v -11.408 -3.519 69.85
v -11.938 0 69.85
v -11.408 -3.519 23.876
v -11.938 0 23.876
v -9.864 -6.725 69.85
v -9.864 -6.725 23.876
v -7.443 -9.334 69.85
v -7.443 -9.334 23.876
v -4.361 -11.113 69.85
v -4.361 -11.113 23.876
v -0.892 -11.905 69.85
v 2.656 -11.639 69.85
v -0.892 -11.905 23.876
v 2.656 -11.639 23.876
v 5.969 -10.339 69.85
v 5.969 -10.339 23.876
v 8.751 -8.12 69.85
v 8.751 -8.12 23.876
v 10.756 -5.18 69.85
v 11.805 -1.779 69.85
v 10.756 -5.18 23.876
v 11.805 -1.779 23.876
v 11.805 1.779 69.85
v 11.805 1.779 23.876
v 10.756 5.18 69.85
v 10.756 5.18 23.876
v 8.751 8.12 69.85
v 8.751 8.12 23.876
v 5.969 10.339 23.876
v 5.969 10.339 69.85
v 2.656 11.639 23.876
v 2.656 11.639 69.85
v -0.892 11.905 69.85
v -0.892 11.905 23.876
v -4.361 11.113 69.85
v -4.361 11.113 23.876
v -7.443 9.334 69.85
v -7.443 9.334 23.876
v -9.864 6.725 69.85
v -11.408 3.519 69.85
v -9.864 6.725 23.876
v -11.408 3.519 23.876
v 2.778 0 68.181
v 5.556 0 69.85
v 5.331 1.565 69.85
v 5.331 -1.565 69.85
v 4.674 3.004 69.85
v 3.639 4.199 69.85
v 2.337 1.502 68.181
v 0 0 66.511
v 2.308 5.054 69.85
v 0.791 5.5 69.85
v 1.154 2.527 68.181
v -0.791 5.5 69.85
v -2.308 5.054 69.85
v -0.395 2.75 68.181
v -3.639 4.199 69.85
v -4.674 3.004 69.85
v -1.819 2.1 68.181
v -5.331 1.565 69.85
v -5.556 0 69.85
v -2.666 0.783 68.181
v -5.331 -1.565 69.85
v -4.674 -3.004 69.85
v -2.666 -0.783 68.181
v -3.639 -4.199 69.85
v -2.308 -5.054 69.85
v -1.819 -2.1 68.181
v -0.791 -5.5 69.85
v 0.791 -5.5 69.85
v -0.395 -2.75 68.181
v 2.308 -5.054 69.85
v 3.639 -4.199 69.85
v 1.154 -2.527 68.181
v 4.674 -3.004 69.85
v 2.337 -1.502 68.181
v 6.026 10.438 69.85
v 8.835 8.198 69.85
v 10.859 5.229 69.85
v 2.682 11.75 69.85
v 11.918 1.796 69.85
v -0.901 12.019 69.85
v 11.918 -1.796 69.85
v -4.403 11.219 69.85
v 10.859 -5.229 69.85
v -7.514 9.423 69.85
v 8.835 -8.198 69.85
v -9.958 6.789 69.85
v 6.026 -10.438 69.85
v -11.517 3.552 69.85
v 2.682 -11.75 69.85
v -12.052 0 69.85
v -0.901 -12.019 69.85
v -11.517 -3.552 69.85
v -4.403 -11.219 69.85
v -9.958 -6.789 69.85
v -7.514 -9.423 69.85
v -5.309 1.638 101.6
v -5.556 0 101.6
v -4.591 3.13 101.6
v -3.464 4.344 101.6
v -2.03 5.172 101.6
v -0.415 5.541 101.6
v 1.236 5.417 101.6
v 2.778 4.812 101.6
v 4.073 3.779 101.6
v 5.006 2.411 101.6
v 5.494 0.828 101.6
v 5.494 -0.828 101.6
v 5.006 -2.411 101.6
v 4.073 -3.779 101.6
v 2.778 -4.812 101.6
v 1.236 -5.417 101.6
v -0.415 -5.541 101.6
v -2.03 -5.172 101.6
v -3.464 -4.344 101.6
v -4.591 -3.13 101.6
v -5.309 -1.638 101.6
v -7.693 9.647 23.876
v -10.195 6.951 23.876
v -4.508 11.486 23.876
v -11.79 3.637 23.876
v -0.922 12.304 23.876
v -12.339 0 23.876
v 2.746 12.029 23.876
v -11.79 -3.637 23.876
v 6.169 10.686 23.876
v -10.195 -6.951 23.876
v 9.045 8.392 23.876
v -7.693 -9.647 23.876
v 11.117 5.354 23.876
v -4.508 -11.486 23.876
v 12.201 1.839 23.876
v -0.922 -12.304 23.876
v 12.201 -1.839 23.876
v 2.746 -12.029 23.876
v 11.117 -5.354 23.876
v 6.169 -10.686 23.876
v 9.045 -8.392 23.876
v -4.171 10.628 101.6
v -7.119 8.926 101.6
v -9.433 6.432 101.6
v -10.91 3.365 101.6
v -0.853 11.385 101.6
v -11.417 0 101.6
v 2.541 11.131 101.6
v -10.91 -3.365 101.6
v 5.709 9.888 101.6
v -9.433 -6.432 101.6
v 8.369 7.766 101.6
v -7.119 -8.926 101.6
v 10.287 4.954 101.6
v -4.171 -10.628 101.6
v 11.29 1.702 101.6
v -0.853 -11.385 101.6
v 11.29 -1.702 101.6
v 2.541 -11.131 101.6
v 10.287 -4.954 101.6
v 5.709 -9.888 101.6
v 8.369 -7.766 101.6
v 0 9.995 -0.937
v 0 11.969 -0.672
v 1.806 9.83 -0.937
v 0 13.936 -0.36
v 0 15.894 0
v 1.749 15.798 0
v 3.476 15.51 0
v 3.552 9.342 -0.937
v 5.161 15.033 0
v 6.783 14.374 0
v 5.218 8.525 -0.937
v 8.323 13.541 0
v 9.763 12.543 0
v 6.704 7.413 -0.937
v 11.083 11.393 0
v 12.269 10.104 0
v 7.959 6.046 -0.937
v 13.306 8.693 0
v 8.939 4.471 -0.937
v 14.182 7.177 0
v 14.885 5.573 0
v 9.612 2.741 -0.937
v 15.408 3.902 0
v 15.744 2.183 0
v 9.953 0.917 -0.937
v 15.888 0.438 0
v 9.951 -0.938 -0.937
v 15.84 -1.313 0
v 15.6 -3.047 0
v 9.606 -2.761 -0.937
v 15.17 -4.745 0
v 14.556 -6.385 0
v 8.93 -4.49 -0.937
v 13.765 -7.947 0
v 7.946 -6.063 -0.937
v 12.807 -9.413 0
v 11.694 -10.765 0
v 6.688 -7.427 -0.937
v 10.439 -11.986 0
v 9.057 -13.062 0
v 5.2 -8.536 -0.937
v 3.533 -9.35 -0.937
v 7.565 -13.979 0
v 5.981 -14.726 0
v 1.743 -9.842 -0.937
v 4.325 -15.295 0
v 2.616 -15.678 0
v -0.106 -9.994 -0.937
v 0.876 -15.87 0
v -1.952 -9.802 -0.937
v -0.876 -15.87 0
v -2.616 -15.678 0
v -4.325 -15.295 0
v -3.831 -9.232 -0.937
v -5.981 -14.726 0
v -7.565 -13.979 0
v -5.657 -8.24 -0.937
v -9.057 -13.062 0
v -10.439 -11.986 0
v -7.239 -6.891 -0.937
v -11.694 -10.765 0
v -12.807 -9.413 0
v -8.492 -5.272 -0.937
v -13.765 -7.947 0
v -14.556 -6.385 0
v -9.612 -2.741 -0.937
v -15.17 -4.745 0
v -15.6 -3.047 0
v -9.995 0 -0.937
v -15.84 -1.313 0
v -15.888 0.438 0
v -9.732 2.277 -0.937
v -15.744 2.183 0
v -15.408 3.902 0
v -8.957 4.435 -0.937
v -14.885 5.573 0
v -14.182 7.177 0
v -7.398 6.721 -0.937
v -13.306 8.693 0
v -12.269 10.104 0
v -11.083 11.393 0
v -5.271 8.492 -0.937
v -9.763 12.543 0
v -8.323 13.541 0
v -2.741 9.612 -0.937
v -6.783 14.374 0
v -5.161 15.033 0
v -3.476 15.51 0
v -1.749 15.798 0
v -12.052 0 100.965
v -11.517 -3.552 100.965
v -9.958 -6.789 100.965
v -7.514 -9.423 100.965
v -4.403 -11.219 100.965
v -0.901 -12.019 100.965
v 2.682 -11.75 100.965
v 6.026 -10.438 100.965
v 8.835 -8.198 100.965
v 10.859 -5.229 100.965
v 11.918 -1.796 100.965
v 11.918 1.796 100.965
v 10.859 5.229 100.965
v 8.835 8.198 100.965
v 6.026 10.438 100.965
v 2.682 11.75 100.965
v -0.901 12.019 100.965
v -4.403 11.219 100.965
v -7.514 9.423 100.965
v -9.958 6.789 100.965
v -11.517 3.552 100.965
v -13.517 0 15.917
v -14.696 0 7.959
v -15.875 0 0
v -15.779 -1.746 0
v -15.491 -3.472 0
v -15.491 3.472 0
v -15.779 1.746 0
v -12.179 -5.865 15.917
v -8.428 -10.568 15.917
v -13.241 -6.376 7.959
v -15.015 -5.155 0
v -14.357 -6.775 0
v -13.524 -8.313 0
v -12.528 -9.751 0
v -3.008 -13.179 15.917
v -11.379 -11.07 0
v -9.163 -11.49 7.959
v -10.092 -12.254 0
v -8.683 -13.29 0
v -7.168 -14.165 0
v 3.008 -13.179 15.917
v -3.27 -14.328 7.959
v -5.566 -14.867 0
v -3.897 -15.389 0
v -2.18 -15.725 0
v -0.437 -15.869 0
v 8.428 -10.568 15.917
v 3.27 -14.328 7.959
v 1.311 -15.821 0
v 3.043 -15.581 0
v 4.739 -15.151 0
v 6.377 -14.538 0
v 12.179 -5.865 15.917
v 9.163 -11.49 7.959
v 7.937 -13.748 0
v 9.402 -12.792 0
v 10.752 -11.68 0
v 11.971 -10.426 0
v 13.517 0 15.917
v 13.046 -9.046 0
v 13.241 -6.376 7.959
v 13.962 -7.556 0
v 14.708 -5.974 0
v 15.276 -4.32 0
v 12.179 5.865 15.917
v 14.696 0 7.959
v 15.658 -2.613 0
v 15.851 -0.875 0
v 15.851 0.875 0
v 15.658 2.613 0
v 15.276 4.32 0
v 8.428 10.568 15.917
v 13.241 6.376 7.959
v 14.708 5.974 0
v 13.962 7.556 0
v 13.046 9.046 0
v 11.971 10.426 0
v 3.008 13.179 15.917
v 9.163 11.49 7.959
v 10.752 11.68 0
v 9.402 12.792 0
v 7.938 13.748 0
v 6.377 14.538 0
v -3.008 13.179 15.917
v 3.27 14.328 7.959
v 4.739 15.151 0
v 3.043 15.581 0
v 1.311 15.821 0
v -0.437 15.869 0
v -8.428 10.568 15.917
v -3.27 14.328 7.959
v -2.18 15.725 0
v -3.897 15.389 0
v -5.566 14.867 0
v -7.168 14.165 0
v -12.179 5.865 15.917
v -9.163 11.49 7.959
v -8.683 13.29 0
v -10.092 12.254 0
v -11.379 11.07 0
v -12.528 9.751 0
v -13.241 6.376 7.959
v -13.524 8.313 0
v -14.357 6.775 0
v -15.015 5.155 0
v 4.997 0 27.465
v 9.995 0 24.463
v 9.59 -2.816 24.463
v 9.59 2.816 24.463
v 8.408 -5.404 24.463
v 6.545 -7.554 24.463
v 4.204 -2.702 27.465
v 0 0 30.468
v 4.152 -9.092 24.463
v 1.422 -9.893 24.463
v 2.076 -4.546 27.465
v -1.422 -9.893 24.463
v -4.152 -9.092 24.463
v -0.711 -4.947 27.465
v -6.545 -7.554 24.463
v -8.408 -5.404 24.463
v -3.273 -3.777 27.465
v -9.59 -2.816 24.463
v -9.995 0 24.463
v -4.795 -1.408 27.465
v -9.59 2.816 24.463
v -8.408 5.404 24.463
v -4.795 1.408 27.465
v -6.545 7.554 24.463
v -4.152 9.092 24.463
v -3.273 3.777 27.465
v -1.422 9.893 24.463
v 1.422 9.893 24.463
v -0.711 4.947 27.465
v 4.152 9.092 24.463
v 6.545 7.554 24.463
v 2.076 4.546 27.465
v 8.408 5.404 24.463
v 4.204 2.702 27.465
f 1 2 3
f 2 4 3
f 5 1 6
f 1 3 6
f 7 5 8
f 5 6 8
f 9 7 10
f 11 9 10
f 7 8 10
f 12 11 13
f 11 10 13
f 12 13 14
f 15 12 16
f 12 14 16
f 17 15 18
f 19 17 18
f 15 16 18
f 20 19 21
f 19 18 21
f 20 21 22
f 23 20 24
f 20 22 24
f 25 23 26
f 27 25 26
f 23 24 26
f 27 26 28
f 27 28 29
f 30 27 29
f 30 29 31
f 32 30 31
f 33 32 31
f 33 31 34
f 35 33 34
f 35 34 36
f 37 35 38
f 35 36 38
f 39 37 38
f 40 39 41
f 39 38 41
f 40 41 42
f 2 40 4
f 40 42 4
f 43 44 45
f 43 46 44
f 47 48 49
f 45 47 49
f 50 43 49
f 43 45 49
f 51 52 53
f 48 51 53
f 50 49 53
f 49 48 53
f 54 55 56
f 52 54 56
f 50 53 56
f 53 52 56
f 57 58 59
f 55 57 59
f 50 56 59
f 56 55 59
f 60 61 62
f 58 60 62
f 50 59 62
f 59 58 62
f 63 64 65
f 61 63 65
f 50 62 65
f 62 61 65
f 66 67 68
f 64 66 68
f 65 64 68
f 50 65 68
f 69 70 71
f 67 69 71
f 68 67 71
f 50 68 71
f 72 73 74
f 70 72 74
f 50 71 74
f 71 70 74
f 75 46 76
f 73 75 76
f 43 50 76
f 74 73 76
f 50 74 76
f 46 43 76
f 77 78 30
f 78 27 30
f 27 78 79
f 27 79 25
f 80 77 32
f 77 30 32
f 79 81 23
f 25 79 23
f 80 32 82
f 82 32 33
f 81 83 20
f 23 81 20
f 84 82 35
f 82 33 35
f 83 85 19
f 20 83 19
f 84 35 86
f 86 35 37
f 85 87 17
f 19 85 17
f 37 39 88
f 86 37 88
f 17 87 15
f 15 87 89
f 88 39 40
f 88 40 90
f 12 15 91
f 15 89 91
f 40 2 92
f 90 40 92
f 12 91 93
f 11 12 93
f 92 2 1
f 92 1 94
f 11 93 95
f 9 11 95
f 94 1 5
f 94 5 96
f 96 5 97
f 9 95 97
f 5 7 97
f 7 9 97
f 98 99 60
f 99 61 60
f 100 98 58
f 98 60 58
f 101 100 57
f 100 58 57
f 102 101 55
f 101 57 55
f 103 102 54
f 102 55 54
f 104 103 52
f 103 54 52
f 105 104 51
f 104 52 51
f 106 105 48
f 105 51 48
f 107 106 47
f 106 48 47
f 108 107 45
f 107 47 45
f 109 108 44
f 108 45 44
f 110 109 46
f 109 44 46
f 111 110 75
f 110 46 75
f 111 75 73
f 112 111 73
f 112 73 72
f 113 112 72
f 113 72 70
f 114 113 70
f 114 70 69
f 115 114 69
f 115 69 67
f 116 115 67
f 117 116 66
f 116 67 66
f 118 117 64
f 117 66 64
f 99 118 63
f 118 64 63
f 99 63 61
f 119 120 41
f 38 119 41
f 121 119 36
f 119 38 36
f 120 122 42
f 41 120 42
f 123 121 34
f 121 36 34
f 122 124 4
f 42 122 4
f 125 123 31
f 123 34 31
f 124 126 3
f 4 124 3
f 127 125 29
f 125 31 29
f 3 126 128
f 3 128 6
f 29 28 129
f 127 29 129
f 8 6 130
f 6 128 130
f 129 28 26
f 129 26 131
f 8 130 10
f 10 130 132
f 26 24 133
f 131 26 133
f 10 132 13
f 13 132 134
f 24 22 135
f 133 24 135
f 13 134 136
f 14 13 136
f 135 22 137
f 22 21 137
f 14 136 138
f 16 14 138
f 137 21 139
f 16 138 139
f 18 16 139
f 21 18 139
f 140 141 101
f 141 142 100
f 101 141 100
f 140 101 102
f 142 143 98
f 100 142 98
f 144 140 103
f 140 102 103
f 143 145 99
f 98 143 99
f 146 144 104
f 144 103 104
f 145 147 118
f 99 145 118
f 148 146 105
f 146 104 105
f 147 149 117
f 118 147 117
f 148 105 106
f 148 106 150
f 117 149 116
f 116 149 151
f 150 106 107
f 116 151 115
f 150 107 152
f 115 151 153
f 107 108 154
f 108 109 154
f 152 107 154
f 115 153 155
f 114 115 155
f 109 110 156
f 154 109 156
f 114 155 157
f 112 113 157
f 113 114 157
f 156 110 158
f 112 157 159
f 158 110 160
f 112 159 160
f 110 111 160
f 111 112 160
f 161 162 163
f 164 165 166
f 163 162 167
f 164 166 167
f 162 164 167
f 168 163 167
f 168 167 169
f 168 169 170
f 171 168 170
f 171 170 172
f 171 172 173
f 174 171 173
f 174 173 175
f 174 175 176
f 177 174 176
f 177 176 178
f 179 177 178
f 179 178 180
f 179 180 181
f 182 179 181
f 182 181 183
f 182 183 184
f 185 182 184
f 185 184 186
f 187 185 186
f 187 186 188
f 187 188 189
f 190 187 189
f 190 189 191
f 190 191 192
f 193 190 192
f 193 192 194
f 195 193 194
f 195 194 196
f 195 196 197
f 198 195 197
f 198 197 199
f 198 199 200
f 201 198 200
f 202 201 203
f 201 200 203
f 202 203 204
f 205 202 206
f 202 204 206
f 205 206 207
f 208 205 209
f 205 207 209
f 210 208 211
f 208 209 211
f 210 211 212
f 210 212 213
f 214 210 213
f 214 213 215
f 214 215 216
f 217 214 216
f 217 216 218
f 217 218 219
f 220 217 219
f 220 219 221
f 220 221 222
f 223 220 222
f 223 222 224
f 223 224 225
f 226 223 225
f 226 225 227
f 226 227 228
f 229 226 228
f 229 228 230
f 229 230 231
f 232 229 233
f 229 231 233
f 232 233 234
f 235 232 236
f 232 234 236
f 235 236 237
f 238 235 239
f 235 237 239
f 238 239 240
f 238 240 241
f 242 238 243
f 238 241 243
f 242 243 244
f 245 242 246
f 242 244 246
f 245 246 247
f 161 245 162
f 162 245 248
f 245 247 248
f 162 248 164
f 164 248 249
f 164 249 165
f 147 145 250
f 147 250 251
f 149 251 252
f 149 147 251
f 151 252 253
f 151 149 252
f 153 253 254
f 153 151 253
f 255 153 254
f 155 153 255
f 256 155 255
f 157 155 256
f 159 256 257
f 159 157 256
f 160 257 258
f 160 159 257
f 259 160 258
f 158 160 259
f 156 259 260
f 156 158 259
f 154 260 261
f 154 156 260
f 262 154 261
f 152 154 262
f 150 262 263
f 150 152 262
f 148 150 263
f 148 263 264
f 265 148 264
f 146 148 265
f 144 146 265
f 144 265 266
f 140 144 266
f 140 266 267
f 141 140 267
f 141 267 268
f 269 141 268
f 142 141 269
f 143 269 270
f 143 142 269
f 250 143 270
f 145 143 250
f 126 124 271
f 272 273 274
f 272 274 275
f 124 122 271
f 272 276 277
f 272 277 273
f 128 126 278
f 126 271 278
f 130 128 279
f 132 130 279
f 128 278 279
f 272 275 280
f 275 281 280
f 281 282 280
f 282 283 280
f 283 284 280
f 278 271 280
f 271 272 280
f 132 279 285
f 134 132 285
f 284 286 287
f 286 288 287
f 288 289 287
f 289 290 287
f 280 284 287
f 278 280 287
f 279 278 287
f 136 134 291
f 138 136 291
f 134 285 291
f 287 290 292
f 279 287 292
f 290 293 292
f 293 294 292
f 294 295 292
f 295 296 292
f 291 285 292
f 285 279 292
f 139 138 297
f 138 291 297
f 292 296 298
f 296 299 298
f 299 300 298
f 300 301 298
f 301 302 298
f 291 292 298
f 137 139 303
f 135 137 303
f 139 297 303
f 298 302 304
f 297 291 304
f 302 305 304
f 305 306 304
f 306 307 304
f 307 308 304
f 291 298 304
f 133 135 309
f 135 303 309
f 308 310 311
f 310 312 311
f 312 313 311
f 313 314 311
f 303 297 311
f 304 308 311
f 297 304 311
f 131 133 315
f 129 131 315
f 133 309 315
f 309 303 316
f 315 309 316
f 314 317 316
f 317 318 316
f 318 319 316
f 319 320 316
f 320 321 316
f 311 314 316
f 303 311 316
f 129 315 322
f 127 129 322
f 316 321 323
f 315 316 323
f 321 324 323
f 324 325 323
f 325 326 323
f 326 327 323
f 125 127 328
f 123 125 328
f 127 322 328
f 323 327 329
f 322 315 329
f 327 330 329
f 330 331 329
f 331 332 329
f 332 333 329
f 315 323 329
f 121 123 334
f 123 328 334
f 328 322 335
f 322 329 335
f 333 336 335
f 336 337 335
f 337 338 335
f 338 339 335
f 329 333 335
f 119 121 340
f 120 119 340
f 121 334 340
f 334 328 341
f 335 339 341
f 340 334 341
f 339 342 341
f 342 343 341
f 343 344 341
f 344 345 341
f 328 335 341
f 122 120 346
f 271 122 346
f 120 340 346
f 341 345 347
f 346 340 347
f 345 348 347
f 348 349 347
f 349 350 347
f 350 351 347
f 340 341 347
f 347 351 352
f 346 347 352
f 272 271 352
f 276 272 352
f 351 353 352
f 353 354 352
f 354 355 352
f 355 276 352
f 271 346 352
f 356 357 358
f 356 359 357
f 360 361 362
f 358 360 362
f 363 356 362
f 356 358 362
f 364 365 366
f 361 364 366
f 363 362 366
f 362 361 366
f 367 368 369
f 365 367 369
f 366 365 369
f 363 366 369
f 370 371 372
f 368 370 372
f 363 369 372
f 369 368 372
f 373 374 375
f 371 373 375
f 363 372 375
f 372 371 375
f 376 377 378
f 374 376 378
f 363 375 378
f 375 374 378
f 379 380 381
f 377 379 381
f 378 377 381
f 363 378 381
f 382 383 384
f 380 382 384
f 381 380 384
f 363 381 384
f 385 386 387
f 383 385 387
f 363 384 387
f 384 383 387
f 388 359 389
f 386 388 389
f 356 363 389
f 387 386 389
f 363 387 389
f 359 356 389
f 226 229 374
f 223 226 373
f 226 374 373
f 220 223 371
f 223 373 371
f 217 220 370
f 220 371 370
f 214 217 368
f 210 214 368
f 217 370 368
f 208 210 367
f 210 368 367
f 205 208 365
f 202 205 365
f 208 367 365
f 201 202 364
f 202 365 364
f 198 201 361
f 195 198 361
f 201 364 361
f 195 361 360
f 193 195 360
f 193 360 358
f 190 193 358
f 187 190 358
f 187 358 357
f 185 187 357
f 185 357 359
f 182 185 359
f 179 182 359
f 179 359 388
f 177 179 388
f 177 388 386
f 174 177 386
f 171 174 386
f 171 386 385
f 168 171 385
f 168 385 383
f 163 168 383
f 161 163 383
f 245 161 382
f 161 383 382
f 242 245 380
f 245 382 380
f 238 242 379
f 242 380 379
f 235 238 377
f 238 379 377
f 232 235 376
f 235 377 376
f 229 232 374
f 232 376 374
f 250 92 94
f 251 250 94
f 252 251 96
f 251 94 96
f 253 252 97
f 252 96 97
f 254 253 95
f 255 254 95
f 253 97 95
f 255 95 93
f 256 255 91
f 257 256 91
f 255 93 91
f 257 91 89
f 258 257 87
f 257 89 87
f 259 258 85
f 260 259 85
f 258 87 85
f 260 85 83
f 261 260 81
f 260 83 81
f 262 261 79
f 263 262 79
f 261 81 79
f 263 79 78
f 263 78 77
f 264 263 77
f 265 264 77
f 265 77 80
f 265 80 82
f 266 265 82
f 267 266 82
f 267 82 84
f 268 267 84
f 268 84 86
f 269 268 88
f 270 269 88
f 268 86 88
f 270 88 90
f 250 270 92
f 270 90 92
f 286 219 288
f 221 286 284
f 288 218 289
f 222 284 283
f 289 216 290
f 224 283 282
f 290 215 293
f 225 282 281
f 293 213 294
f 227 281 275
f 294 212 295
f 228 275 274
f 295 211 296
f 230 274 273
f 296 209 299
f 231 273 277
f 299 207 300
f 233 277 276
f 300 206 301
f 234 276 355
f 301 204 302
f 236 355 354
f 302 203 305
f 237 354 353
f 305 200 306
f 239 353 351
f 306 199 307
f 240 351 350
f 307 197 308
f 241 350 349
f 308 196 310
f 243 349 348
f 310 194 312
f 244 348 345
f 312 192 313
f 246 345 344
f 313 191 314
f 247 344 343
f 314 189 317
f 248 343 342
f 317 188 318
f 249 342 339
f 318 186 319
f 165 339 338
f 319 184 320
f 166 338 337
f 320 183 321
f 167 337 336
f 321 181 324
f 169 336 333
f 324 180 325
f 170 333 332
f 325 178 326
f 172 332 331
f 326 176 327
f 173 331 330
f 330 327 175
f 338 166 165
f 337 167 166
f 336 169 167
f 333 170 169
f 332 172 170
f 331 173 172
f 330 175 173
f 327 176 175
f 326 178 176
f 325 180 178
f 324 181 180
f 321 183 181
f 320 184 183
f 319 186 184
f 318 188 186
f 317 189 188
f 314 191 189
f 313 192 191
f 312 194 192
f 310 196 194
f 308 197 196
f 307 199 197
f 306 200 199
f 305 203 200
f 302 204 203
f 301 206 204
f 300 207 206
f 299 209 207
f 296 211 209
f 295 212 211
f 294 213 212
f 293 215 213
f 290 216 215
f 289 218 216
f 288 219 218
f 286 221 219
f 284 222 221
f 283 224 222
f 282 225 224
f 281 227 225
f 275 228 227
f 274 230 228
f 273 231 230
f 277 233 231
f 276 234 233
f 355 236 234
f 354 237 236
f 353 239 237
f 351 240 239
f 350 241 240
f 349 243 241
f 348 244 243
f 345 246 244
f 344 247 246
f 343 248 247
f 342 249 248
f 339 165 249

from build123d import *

# Parameters (mm, degrees)
F3_D     = 11.1125
F3_DEPTH = 31.75
F3_TIP   = 3.3385318145
F4_SIZE  = 0.635
F9_D     = 19.9898
F9_DEPTH = 25.4
F9_START = 2.3646856
F9_TIP   = 6.0055418011


with BuildPart() as f1:
    # F0 (on Front) → F1 (revolve)
    with BuildSketch(Plane.XZ):
        Polygon((-15.875, 0), (0, 0), (0, 101.6), (-12.0523, 101.6), (-12.0523, 69.85), (-11.938, 69.85), (-11.938, 26.5810513018), (-11.938, 23.876), (-12.3386533396, 23.876), align=None)
    revolve(axis=Axis((0, 0, 57.15), (0, 0, 1)))

    # F3
    with Locations(Plane.XY.offset(101.6)):
        with Locations((0, 0)):
            Hole(F3_D / 2, depth=F3_DEPTH)
            with Locations((0, 0, -(F3_DEPTH + F3_TIP / 2))):  # 118° drill point
                Cone(0, F3_D / 2, F3_TIP, mode=Mode.SUBTRACT)

    # F4
    f4_edges = [f1.edges().sort_by_distance(p)[0] for p in [
        (12.0523, 0, 101.6),
    ]]
    chamfer(f4_edges, length=F4_SIZE)

    # F5 (on Right) → F6 (revolve)
    with BuildSketch(Plane.YZ):
        with BuildLine():
            Line((0, 0), (0, -1.5446243323))
            ThreePointArc((0, -1.5446243323), (7.9846333239, -1.1575608103), (15.8943893541, 0))
            Line((15.8943893541, 0), (0, 0))
        make_face()
    revolve(axis=Axis((0, 0, -1.5006620425), (0, 0, -1)))

    # F9
    # its depths count from where the whole tool has entered the part; down to there all is cleared
    with Locations(Plane(origin=(0, 0, -3.302), x_dir=(1, 0, 0), z_dir=(0, 0, -1)).offset(-F9_START)):
        with Locations((0, 0)):
            Hole(F9_D / 2, depth=F9_DEPTH)
            with Locations((0, 0, -(F9_DEPTH + F9_TIP / 2))):  # 118° drill point
                Cone(0, F9_D / 2, F9_TIP, mode=Mode.SUBTRACT)


solid = f1.part
